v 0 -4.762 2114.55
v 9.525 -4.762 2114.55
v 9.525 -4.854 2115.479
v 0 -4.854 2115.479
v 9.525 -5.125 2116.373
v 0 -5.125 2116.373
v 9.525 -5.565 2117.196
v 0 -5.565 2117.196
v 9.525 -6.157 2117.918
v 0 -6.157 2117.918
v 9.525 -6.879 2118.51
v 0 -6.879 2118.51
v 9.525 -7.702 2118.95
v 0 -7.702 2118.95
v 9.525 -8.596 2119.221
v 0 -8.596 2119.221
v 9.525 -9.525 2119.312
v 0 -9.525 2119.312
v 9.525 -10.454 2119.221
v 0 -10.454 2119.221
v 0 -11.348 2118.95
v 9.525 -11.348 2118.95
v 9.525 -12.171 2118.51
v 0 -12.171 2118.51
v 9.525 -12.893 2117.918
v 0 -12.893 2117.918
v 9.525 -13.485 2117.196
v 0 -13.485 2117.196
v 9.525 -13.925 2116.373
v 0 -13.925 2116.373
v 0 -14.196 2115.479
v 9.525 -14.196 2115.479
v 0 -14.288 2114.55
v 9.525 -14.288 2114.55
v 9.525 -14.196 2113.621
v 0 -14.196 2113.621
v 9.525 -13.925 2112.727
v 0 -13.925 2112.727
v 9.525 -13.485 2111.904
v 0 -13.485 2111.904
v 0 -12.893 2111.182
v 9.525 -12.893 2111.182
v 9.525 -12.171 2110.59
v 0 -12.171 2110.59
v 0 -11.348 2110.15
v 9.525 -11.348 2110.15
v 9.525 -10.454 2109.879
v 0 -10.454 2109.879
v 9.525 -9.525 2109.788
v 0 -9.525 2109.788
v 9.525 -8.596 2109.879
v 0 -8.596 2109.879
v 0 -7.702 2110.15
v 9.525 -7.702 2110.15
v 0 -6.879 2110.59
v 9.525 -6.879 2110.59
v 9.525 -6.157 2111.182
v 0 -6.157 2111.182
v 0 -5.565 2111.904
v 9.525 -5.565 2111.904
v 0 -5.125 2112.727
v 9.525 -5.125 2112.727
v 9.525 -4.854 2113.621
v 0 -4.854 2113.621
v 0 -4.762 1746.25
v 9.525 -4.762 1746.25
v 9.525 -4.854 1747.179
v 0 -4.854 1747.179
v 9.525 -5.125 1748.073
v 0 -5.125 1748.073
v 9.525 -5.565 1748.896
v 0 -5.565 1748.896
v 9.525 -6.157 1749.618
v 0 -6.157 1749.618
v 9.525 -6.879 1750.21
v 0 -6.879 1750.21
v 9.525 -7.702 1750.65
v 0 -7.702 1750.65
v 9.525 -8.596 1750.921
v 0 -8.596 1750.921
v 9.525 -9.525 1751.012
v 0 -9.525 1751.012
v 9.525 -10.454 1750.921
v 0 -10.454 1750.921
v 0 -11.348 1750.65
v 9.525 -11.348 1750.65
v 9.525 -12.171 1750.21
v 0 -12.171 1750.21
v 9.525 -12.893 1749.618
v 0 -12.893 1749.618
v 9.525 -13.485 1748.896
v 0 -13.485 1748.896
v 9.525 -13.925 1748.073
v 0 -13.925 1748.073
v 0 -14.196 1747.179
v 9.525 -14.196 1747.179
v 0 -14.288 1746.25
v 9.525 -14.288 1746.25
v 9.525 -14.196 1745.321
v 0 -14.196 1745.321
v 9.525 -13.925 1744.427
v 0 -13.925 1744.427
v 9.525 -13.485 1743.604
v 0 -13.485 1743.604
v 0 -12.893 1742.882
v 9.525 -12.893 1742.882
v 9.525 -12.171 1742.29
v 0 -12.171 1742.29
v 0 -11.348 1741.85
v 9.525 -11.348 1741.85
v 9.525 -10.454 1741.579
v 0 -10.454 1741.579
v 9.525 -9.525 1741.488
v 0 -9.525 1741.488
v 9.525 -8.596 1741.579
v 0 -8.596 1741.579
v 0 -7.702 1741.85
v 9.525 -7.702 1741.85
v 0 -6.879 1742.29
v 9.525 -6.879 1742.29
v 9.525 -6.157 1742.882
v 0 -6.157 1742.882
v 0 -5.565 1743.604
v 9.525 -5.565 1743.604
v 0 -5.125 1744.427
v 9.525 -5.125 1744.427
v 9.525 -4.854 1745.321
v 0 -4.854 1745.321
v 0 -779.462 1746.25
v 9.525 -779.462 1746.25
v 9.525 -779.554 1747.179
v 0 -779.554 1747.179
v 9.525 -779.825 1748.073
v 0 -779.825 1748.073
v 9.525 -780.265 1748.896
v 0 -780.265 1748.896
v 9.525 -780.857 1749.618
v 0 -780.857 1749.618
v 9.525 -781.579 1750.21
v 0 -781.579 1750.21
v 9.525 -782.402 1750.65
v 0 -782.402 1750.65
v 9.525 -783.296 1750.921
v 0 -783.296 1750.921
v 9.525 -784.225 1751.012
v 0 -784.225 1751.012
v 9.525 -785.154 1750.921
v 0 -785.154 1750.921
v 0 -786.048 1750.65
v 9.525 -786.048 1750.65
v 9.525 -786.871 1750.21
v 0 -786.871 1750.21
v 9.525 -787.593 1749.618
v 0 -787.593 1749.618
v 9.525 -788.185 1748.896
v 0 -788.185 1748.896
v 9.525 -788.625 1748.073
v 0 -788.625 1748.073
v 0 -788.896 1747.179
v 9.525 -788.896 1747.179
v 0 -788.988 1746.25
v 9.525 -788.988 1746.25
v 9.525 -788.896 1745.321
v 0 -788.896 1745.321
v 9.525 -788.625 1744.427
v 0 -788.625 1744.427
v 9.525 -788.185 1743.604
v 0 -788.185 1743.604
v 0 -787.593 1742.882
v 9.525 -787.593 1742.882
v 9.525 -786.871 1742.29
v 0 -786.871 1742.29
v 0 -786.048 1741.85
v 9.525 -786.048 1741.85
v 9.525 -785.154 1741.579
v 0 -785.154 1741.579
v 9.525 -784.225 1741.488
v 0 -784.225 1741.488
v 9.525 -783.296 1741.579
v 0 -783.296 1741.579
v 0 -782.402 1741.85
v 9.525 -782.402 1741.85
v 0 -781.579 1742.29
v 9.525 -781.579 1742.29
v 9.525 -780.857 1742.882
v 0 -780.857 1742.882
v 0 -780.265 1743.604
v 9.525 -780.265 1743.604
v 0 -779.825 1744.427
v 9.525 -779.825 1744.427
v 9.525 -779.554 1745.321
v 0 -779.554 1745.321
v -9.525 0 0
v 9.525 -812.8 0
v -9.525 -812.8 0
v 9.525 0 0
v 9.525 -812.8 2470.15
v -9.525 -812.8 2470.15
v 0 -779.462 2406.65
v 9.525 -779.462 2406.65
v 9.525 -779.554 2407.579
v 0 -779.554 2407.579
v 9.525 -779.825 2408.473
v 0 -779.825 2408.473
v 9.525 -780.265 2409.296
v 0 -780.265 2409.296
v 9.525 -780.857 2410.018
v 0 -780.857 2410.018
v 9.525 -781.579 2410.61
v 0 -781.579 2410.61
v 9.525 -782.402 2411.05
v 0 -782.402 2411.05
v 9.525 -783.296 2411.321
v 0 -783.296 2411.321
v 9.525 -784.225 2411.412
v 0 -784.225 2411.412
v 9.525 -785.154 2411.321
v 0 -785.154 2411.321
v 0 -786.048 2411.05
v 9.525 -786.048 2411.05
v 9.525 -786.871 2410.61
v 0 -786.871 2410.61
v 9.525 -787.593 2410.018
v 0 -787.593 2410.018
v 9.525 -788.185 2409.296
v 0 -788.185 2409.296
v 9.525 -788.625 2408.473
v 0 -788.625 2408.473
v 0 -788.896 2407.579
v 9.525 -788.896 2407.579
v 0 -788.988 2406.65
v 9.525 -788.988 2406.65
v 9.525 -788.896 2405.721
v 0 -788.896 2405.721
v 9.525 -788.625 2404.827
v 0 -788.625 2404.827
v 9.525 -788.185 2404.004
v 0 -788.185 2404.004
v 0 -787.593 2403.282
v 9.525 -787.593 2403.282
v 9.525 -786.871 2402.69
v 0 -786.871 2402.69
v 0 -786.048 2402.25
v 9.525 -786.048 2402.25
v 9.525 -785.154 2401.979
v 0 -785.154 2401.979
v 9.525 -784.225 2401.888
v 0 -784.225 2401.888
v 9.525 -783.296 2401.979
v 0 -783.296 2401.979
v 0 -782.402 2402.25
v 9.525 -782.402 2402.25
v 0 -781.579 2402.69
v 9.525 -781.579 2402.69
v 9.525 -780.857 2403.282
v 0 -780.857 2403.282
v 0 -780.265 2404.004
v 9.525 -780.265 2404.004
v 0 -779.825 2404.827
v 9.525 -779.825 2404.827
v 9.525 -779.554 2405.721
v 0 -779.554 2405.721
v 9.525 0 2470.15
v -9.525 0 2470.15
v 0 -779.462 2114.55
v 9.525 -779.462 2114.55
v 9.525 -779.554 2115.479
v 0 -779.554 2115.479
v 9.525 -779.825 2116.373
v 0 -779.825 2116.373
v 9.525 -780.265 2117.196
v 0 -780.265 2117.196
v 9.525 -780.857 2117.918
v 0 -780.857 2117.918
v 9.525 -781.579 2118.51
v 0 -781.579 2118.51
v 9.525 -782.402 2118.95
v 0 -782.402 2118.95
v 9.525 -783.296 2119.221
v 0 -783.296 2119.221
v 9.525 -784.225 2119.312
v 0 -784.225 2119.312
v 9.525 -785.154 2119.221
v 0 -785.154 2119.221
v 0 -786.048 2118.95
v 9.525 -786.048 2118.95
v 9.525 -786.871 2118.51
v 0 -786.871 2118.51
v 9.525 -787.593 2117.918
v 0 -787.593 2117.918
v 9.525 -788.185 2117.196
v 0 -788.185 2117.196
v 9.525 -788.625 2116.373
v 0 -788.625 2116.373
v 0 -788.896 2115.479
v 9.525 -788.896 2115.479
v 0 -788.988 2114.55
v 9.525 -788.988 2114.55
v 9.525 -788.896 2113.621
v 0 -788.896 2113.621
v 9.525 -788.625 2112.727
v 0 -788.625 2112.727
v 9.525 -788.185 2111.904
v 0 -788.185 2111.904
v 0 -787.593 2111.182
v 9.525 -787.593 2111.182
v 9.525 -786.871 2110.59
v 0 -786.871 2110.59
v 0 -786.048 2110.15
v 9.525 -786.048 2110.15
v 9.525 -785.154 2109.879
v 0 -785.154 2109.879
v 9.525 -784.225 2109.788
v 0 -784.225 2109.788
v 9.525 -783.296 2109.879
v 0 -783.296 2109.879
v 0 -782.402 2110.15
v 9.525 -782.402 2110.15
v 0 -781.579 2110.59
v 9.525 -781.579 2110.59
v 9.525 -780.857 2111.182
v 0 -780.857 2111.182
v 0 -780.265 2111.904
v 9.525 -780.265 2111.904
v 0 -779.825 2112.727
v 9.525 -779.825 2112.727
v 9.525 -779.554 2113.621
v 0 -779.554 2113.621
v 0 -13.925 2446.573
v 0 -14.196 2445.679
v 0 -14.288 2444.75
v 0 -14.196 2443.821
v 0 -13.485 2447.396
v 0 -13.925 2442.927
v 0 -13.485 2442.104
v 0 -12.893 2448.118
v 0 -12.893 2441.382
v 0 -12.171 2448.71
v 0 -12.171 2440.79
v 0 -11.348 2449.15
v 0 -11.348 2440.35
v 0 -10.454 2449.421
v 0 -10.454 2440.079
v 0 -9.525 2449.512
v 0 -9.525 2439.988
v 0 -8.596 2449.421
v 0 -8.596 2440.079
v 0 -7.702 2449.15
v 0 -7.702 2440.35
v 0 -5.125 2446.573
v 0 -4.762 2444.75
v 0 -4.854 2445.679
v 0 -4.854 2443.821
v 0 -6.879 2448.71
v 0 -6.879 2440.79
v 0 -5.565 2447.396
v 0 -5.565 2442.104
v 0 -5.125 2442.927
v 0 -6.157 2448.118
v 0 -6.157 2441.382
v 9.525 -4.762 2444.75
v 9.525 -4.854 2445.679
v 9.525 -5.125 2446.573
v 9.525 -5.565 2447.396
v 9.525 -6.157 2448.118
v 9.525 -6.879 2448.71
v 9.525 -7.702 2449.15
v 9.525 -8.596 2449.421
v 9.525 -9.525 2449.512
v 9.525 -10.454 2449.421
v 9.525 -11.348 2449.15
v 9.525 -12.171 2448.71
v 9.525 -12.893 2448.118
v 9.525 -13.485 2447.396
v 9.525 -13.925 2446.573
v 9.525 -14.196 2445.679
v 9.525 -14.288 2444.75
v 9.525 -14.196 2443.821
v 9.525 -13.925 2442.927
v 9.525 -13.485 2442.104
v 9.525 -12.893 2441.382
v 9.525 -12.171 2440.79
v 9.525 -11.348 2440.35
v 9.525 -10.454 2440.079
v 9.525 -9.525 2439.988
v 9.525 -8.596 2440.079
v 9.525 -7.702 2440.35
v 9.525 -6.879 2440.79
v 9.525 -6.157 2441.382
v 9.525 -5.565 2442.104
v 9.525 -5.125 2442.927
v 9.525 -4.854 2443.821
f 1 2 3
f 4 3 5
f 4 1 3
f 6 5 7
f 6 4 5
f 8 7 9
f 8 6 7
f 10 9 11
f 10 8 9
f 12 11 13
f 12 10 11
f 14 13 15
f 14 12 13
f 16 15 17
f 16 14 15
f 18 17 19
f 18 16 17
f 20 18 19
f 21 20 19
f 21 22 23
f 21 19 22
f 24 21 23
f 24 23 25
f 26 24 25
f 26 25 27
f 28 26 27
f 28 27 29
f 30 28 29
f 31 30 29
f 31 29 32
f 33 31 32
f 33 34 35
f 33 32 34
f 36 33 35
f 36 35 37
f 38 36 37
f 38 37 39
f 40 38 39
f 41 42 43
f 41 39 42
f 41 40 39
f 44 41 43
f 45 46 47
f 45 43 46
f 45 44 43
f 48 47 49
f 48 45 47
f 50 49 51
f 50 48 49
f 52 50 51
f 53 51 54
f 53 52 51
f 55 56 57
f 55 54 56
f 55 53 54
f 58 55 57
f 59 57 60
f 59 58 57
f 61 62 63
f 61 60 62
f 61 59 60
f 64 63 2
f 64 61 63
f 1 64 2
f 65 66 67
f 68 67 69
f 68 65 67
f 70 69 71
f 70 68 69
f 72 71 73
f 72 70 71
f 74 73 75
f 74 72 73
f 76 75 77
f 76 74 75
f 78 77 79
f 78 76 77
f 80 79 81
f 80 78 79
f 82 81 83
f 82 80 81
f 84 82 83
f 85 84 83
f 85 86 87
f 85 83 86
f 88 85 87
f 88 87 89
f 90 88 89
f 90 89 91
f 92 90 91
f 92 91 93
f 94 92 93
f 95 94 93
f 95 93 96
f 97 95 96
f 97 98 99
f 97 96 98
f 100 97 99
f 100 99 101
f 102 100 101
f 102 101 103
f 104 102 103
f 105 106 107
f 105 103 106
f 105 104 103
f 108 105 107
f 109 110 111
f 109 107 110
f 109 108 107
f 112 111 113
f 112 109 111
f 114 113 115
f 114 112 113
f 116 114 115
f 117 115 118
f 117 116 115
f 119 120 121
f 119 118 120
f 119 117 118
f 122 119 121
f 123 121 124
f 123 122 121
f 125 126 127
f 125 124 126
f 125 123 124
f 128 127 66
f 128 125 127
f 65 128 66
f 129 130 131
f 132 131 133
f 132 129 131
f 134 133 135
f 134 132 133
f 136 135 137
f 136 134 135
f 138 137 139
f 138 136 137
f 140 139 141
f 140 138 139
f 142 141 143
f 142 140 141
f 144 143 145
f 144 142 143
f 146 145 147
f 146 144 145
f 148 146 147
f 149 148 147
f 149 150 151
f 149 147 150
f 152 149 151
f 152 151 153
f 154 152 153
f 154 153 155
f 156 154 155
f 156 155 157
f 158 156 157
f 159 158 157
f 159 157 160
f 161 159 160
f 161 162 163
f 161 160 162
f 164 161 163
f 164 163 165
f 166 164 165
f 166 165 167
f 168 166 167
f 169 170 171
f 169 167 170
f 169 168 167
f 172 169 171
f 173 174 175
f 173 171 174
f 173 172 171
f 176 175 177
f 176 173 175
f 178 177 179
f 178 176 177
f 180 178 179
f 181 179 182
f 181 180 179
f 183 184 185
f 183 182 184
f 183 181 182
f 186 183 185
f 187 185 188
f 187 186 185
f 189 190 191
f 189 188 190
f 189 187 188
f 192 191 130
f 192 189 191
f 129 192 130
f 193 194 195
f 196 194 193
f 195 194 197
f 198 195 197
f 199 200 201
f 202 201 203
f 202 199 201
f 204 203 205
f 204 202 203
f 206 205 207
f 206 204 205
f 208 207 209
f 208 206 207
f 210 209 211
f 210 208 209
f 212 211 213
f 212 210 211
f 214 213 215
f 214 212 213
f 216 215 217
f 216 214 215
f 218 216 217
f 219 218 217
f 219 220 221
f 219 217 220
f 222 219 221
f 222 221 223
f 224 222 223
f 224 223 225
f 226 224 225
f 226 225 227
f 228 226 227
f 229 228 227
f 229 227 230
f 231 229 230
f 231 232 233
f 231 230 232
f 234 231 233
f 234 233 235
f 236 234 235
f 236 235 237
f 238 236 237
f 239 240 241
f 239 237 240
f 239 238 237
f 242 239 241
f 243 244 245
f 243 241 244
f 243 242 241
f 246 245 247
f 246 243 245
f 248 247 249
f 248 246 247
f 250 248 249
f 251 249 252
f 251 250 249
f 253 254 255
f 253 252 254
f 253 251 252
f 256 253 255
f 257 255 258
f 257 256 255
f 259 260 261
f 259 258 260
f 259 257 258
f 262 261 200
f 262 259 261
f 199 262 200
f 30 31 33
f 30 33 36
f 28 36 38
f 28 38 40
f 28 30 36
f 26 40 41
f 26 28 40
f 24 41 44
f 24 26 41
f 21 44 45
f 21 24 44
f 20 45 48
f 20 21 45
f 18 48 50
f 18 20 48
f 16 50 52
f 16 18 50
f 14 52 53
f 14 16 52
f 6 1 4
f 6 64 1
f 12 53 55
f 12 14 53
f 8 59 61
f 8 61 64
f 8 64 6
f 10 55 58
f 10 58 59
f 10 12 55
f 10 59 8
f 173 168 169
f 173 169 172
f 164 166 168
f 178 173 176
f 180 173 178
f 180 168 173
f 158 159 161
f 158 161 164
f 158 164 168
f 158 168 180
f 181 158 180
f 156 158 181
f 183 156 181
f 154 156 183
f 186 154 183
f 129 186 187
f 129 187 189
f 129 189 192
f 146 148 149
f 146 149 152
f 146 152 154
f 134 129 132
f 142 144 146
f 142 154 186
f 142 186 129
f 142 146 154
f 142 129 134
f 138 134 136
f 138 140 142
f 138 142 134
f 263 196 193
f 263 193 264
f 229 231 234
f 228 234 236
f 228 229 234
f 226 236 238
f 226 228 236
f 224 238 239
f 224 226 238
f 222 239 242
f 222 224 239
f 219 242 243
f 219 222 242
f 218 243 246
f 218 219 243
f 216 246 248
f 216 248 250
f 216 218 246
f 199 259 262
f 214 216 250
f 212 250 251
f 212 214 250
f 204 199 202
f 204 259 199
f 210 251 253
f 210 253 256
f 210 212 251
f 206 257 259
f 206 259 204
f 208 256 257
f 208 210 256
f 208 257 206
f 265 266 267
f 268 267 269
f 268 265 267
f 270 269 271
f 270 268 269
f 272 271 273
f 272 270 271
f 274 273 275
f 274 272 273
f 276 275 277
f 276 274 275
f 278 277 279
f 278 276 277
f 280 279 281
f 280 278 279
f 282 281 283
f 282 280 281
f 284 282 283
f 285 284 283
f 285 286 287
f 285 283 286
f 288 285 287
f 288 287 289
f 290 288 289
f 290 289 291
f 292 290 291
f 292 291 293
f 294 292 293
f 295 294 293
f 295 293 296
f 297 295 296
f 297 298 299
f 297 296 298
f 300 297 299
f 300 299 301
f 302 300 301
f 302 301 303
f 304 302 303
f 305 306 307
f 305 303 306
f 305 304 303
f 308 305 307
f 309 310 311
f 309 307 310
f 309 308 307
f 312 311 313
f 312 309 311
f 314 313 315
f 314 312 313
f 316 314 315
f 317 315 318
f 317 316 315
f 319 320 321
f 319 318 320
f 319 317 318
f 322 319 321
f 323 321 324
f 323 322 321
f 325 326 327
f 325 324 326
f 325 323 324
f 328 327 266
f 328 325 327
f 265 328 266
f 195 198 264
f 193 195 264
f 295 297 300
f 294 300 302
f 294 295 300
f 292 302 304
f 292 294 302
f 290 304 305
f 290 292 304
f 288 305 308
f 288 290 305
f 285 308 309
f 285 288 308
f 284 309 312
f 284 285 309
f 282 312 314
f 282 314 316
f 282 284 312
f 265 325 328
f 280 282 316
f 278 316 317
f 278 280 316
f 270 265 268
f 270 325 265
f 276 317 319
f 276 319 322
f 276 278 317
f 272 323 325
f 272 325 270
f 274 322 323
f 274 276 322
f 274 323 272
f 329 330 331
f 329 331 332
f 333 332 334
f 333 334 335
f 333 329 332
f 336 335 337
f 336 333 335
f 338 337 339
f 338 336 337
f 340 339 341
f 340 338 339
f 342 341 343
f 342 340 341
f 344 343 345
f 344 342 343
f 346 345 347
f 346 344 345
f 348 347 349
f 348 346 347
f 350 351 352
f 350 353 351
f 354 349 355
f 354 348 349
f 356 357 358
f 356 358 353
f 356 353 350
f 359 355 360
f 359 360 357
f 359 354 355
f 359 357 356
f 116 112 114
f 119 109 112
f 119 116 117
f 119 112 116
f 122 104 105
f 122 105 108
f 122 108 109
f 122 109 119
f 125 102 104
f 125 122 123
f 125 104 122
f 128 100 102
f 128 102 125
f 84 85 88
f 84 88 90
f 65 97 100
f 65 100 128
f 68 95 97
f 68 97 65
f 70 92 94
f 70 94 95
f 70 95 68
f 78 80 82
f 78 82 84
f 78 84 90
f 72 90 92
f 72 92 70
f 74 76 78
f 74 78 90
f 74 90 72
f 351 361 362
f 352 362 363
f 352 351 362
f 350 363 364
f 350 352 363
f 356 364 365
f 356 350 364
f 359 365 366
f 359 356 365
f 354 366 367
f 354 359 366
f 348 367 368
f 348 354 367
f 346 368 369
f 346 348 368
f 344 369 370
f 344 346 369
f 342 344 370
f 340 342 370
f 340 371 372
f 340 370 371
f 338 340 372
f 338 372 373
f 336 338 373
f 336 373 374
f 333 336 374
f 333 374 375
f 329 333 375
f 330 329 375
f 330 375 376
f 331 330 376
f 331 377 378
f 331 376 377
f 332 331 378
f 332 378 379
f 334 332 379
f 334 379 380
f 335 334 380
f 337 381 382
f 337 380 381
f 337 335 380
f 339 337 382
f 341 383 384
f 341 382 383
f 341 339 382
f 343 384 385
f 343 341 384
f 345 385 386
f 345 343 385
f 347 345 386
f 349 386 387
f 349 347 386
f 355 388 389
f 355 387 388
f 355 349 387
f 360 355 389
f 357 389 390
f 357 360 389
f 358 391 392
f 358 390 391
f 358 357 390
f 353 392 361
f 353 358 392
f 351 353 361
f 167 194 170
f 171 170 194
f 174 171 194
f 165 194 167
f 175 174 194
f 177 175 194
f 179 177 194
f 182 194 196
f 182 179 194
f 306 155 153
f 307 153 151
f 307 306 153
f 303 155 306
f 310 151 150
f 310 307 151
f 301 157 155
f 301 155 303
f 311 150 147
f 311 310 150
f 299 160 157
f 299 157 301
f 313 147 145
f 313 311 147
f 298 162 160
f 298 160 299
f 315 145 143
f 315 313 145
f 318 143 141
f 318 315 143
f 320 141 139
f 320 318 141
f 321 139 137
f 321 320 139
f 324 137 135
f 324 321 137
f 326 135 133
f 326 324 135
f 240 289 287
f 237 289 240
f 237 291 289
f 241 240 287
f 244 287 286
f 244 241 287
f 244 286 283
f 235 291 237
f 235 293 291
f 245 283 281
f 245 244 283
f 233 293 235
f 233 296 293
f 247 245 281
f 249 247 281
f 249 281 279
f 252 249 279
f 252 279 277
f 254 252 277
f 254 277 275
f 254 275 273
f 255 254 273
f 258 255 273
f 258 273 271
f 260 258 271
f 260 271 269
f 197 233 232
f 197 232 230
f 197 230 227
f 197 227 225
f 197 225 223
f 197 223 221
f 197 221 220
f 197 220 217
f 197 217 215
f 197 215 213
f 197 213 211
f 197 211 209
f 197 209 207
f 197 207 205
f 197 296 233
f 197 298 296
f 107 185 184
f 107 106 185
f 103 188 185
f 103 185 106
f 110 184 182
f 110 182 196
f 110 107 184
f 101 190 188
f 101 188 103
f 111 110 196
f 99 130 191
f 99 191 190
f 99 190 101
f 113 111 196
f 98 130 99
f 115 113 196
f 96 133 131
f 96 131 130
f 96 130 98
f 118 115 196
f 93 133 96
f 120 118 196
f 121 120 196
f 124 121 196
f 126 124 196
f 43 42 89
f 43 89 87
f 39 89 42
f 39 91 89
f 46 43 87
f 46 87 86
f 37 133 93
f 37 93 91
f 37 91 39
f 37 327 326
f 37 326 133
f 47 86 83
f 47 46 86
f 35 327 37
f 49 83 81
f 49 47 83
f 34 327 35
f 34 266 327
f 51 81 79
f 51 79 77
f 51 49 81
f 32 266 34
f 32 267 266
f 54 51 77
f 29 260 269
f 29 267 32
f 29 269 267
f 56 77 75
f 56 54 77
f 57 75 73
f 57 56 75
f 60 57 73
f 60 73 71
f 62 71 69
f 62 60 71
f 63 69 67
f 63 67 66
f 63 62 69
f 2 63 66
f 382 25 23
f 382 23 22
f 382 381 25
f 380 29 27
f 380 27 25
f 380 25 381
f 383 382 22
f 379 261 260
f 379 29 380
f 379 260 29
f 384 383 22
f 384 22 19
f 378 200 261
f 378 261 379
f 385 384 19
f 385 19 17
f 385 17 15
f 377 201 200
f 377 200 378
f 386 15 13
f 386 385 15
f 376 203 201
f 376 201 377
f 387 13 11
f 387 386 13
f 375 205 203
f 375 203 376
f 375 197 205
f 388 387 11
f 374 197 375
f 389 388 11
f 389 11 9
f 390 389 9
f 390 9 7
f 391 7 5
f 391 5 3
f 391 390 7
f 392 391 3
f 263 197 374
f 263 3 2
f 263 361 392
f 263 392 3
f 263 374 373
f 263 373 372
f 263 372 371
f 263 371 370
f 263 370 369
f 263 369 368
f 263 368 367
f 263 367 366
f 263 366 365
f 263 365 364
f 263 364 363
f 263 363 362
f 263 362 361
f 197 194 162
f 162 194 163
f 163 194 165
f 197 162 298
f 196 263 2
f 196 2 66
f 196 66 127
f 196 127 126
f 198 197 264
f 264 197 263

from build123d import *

# Parameters (mm, degrees)
F0_W     = 812.8
F0_H     = 2470.15
F1_DEPTH = 9.525
F2_R     = 4.7625
F3_DEPTH = 19.05


with BuildPart() as f1:
    # F0 (on Right) → F1 (new body, symmetric)
    with BuildSketch(Plane.YZ):
        with Locations((-406.4, 1235.075)):
            Rectangle(F0_W, F0_H)
    extrude(amount=F1_DEPTH, both=True)

    # F2 (on Right) → F3 (cut)
    with BuildSketch(Plane.YZ):
        with Locations((-784.225, 2114.55)):
            Circle(F2_R)
        with Locations((-784.225, 2406.65)):
            Circle(F2_R)
        with Locations((-9.525, 2444.75)):
            Circle(F2_R)
        with Locations((-9.525, 2114.55)):
            Circle(F2_R)
        with Locations((-784.225, 1746.25)):
            Circle(F2_R)
        with Locations((-9.525, 1746.25)):
            Circle(F2_R)
    extrude(amount=F3_DEPTH, mode=Mode.SUBTRACT)


solid = f1.part
